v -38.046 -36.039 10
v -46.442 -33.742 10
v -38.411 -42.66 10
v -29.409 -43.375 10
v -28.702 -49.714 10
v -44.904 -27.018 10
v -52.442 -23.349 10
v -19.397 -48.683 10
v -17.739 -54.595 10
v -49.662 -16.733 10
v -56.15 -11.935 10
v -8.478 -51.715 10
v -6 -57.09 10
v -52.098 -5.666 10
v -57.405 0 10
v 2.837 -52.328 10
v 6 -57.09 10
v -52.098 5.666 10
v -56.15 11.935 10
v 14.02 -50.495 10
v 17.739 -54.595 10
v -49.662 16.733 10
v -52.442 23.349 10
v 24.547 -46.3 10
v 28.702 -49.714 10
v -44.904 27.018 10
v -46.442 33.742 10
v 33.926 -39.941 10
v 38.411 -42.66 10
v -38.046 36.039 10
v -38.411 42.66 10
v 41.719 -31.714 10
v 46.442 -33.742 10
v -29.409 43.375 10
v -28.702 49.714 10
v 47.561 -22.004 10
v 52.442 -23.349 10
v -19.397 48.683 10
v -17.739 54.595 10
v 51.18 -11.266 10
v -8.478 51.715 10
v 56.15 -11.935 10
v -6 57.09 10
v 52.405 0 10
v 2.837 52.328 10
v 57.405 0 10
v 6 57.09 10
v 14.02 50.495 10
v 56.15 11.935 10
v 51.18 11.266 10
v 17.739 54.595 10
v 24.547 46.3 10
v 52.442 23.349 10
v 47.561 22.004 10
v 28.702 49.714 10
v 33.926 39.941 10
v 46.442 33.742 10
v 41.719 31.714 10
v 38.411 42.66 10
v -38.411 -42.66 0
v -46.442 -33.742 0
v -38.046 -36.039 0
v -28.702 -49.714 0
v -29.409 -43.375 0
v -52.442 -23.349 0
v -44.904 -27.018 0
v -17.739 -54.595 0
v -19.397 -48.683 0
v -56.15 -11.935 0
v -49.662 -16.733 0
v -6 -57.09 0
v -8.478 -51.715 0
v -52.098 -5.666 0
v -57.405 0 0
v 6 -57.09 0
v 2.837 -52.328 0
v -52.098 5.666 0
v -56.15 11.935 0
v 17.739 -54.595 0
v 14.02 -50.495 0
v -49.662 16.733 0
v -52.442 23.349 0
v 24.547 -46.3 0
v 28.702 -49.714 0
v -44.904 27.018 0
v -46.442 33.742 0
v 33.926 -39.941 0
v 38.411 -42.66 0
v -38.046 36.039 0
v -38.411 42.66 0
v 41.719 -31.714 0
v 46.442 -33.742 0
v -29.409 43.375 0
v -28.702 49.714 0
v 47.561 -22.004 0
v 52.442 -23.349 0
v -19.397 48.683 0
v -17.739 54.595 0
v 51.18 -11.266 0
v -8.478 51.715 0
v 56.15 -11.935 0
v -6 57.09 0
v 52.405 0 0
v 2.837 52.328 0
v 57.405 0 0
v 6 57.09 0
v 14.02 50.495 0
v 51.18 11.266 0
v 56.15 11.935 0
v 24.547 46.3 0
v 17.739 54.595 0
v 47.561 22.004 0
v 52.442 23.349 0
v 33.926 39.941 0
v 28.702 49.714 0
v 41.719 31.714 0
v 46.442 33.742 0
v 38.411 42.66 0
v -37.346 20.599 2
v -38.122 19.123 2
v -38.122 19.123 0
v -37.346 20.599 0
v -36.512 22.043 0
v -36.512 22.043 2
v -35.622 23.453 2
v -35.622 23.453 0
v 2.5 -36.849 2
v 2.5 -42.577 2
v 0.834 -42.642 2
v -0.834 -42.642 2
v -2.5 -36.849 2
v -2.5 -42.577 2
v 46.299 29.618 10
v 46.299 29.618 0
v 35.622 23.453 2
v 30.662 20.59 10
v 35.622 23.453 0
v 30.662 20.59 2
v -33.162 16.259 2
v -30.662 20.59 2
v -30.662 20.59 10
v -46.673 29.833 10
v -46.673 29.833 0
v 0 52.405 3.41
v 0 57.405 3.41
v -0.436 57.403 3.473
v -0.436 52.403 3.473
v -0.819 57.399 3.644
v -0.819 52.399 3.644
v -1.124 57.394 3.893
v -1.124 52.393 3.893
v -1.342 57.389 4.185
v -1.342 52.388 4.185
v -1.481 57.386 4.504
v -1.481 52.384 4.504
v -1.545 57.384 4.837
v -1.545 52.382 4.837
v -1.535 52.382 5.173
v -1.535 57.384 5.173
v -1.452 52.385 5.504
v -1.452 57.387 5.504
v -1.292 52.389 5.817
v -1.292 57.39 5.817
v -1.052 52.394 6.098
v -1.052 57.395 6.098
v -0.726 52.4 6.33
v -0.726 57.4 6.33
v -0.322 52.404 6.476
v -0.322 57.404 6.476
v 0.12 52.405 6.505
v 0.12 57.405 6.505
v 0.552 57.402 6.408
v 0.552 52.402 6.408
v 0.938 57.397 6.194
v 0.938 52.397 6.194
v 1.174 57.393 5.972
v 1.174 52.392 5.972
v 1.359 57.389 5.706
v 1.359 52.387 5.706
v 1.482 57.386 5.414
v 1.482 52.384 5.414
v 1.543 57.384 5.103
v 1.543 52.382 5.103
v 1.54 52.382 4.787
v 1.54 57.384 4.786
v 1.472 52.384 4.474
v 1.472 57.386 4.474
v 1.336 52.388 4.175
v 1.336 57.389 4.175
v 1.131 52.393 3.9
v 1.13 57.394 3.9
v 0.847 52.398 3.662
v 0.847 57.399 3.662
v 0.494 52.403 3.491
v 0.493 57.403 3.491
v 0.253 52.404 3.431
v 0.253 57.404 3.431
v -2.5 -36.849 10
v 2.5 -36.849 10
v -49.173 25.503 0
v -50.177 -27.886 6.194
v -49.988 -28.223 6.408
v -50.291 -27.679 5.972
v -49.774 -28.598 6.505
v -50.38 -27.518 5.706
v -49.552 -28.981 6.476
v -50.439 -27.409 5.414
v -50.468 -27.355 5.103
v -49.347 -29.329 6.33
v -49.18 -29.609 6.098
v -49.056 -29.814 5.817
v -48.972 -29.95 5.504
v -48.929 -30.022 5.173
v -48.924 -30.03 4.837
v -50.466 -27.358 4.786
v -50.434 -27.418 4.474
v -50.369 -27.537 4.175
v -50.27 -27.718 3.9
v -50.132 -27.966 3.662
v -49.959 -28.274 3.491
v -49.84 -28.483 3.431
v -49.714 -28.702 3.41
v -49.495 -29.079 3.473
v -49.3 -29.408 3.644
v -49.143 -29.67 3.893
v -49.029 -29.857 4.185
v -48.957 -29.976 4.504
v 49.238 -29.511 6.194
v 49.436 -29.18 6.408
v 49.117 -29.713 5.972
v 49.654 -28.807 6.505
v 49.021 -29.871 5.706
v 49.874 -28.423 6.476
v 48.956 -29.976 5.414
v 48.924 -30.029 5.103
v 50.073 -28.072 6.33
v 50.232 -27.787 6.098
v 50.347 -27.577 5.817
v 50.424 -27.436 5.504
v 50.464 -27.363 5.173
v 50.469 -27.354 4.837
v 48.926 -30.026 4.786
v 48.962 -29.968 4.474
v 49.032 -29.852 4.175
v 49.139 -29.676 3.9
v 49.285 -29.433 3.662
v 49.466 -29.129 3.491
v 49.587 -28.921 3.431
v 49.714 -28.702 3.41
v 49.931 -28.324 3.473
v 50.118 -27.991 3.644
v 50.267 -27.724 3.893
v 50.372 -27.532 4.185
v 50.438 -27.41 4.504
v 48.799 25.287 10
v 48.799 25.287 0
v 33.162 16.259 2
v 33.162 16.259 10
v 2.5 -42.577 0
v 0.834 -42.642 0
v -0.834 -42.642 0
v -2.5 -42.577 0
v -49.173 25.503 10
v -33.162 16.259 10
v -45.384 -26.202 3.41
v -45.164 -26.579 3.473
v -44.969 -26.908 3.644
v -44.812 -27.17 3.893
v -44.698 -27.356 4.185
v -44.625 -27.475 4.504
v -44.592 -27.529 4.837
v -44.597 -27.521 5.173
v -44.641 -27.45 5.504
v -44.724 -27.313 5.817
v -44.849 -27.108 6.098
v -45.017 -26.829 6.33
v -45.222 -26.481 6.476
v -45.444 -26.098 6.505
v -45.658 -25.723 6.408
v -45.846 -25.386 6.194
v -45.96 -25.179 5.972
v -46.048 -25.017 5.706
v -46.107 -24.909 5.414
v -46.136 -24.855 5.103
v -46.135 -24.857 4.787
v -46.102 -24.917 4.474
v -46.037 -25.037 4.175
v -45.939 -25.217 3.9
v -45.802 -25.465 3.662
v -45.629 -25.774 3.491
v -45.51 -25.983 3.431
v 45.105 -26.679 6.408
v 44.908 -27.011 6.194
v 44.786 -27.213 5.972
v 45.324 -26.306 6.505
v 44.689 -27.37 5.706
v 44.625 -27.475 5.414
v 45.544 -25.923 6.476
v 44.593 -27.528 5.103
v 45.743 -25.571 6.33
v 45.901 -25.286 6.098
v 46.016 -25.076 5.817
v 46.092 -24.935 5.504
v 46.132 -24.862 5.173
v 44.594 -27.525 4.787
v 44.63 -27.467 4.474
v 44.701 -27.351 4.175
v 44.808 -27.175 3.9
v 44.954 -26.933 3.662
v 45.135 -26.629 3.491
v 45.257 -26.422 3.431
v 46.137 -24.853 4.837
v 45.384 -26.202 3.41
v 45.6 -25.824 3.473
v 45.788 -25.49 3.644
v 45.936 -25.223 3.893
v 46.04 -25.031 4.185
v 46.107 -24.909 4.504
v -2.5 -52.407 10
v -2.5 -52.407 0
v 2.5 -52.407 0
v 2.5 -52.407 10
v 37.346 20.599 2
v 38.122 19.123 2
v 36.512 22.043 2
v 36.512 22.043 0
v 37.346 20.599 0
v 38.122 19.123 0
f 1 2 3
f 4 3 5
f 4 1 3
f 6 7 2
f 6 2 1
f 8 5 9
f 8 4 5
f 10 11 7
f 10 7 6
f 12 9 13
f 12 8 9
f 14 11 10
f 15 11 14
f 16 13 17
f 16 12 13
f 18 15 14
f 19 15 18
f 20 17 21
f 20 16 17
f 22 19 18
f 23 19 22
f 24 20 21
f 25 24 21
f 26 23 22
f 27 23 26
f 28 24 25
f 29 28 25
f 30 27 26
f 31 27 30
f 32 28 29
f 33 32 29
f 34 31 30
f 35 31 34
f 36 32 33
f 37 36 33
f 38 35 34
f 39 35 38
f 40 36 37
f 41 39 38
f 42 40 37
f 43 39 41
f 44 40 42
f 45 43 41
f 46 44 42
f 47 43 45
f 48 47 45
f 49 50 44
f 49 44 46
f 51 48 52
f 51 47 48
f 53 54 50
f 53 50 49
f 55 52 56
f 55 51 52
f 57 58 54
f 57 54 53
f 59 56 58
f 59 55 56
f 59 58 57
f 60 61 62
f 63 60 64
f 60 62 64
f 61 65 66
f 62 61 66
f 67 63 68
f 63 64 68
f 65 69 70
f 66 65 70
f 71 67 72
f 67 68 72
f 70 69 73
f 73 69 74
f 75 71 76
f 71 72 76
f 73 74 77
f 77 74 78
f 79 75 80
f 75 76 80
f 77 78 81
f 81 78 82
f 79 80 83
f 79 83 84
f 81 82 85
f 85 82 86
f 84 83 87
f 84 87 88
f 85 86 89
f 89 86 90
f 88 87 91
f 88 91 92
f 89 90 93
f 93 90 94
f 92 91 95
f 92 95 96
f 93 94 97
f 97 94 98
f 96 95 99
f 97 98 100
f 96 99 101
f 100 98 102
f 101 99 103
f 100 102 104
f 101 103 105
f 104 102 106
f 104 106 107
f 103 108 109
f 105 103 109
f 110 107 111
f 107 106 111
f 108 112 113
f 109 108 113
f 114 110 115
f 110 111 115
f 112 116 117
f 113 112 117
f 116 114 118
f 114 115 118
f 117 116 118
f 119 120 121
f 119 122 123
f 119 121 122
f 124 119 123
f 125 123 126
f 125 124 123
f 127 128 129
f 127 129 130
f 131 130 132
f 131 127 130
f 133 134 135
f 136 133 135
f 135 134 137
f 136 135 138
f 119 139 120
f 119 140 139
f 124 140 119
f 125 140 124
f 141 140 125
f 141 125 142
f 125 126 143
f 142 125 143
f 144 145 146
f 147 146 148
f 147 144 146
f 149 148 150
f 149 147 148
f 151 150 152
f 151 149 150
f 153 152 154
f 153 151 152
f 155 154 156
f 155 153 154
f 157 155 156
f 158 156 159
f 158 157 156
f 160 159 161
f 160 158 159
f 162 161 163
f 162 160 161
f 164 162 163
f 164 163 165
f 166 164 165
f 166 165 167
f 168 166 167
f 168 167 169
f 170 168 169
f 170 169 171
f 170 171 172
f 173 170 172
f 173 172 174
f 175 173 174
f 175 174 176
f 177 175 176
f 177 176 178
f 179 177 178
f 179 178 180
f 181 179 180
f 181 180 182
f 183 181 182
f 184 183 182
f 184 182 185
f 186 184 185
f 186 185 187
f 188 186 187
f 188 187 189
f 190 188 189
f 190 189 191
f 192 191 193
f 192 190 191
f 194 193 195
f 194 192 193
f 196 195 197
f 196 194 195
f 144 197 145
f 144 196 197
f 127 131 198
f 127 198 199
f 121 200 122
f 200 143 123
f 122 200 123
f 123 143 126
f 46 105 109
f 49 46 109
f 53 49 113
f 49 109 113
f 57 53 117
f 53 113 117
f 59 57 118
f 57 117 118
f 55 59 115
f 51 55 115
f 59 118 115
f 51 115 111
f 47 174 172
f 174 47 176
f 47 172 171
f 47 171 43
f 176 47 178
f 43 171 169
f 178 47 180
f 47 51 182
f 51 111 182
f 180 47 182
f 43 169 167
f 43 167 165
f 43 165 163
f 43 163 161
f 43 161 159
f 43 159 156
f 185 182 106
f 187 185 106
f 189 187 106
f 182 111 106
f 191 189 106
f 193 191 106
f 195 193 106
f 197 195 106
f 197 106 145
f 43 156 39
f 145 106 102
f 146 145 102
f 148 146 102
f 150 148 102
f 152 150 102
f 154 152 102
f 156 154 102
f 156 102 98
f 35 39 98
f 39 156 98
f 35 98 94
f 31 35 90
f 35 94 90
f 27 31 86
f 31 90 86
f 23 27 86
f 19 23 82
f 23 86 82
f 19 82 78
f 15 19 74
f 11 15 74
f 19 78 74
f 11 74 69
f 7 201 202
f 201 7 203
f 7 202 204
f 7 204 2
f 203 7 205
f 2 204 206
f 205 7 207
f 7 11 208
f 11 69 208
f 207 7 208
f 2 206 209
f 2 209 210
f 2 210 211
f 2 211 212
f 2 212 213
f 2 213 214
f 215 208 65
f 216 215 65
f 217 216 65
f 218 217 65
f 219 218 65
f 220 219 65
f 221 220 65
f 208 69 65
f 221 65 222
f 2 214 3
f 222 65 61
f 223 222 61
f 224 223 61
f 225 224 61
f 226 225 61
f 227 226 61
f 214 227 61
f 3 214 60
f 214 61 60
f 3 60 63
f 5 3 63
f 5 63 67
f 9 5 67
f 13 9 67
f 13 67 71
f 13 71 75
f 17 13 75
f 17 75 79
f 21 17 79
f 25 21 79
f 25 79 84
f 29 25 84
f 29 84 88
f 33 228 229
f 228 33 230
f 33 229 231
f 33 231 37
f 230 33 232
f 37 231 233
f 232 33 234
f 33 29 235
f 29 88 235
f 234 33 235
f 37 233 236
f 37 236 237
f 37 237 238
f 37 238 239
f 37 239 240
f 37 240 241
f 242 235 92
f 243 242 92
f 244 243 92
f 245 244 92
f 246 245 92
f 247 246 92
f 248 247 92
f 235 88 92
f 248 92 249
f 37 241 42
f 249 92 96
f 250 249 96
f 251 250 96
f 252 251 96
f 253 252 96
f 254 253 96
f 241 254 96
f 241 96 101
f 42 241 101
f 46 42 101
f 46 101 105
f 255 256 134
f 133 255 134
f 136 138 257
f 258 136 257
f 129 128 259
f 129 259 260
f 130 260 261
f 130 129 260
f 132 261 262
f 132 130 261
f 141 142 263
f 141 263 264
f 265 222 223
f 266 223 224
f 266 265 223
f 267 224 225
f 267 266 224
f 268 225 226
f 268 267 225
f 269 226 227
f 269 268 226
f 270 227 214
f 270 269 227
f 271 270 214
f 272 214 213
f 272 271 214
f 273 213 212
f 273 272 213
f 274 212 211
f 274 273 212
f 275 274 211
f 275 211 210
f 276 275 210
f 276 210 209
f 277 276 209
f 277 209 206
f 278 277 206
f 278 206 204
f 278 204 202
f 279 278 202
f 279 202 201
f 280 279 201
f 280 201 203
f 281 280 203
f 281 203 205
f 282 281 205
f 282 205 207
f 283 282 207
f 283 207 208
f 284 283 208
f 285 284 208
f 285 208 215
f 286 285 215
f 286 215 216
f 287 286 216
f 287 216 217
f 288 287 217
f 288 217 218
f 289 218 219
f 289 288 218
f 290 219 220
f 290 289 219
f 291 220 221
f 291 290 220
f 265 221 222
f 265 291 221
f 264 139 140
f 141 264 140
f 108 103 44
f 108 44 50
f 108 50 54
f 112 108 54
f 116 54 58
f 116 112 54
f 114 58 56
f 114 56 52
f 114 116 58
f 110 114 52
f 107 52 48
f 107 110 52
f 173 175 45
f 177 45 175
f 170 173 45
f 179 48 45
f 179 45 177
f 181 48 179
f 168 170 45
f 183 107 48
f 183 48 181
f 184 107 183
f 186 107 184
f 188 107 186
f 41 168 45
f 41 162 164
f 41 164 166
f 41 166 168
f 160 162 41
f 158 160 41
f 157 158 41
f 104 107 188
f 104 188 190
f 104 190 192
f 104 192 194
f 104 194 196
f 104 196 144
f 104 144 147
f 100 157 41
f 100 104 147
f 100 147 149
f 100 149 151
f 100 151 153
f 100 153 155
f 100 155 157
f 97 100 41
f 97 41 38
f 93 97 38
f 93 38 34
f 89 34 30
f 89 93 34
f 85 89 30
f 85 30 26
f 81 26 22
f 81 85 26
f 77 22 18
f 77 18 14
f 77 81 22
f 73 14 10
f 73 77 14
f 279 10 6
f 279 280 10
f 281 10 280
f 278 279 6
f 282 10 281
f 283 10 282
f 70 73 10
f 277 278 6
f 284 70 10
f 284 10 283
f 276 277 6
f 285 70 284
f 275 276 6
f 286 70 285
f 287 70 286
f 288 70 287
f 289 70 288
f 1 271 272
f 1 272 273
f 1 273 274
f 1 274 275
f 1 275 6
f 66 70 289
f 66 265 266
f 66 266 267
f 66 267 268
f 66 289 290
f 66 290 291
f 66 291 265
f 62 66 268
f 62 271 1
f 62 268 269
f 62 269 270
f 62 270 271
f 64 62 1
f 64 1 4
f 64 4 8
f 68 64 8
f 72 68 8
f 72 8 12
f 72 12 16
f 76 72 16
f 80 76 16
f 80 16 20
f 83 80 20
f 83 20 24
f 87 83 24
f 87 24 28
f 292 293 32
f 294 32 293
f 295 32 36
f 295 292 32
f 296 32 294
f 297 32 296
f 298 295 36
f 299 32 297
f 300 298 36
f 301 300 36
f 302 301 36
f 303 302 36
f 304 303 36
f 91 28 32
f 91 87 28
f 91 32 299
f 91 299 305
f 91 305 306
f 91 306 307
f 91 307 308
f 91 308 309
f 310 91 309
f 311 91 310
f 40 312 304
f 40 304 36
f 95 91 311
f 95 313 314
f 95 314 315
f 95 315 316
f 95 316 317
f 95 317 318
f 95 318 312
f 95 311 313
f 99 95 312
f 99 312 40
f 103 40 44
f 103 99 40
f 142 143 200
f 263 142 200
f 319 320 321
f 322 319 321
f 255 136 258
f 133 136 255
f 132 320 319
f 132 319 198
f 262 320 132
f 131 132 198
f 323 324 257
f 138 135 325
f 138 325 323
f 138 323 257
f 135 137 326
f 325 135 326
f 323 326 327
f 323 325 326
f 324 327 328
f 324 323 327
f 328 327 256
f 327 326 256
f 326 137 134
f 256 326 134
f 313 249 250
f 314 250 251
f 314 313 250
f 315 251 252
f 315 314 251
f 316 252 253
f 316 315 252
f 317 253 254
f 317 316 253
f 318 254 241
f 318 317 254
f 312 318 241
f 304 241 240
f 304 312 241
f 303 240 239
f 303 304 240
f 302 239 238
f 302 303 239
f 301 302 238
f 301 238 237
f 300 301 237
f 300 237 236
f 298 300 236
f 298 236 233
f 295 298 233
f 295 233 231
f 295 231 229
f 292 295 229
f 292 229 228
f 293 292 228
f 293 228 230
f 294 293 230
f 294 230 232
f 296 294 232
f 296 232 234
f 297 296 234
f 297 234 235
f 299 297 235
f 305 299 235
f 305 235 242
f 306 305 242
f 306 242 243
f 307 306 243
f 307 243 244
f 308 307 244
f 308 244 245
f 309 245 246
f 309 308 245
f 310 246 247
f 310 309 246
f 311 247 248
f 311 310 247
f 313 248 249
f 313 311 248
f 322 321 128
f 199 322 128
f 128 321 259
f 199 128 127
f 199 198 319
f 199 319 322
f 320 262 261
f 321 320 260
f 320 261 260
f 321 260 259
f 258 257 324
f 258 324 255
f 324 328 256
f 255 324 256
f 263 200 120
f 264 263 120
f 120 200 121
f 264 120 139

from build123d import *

# Parameters (mm, degrees)
SKETCH_1_R                 = 57.404900142
SKETCH_1_R_2               = 52.404900142
EXTRUDE_1_DEPTH            = 10
EXTRUDE_1_2_DEPTH          = 10
SKETCH_1_W                 = 5
SKETCH_1_H                 = 15.558252754
EXTRUDE_1_3_DEPTH          = 10
EXTRUDE_1_4_DEPTH          = 10
CUT_EXTRUDE_1_REACH        = 83.796
CUT_EXTRUDE_1_END_RADIUS   = 57.404900142
SKETCH_3_R                 = 1.55
PATTERN_CIRCULAR_1_COUNT   = 3
CUT_EXTRUDE_1_2_DEPTH      = 82.796363895
CUT_EXTRUDE_1_2_DEPTH_BACK = 2


with BuildPart() as part:
    # 草图1 → 拉伸-薄壁1 (new body)
    with BuildSketch(Plane.XY):
        Circle(SKETCH_1_R)
        Circle(SKETCH_1_R_2, mode=Mode.SUBTRACT)
    extrude(amount=EXTRUDE_1_DEPTH)

    # Cut-Extrude 1: up to this cylinder (the profile starts inside it)
    cut_extrude_1_end = Plane(origin=(0, 0, 4.960066), z_dir=(0, 0, -1)) * Cylinder(CUT_EXTRUDE_1_END_RADIUS, 283.401800284, mode=Mode.PRIVATE)
    # 草图3 → Cut-Extrude 1 (cut, up to the surface)
    with BuildSketch(Plane(origin=(0, 0, 0), x_dir=(1, 0, 0), z_dir=(0, 1, 0)), mode=Mode.PRIVATE) as cut_extrude_1_sk1:
        with Locations(Location((0, -4.960065679, 0), (0, 0, 90))):
            Circle(SKETCH_3_R)
    cut_extrude_1_tool1 = extrude(cut_extrude_1_sk1.sketch, amount=CUT_EXTRUDE_1_REACH, mode=Mode.PRIVATE) & cut_extrude_1_end
    cut_extrude_1 = cut_extrude_1_tool1.solids().sort_by_distance((0, 0, 4.960066))[0]
    add(cut_extrude_1, mode=Mode.SUBTRACT)

    # 阵列(圆周)1: Cut-Extrude 1 ×3 about axis
    pattern_circular_1_axis = Axis((0, 0, 10), (0, 0, -1))
    for i in range(1, PATTERN_CIRCULAR_1_COUNT):
        add(cut_extrude_1.rotate(pattern_circular_1_axis, i * 360 / PATTERN_CIRCULAR_1_COUNT), mode=Mode.SUBTRACT)


with BuildPart() as body_2:
    # 草图1 → Extrude 1 2 (new body)
    with BuildSketch(Plane.XY):
        Polygon((33.162241497, 16.259477709), (48.799038315, 25.287386561), (46.299038315, 29.61751358), (30.662241497, 20.589604728), align=None)
    extrude(amount=EXTRUDE_1_2_DEPTH)


with BuildPart() as body_3:
    # 草图1 → Extrude 1 3 (new body)
    with BuildSketch(Plane.XY):
        with Locations((0, -44.628208814)):
            Rectangle(SKETCH_1_W, SKETCH_1_H)
    extrude(amount=EXTRUDE_1_3_DEPTH)


with BuildPart() as body_4:
    # 草图1 → Extrude 1 4 (new body)
    with BuildSketch(Plane.XY):
        Polygon((-30.662241497, 20.589604728), (-46.673106184, 29.833481765), (-49.173106184, 25.503354746), (-33.162241497, 16.259477709), align=None)
    extrude(amount=EXTRUDE_1_4_DEPTH)


with BuildPart() as cut_extrude_1_2_tool:
    # 草图4 → Cut-Extrude 1 2 (new, two sides: drawn at the far end of the back side and taken through both)
    with BuildSketch(Plane(origin=(0, 0, 0), x_dir=(-1, 0, 0), z_dir=(0, 0, -1)).offset(-CUT_EXTRUDE_1_2_DEPTH_BACK)):
        with BuildLine():
            ThreePointArc((-7.526470588, 41.980647214), (0, -42.65), (7.526470588, 41.980647214))
            Line((7.526470588, 41.980647214), (6.326470588, 35.287367001))
            ThreePointArc((6.326470588, 35.287367001), (0, -35.85), (-6.326470588, 35.287367001))
            Line((-6.326470588, 35.287367001), (-7.526470588, 41.980647214))
        make_face()
    extrude(amount=CUT_EXTRUDE_1_2_DEPTH + CUT_EXTRUDE_1_2_DEPTH_BACK)


with BuildPart() as body_2_1:
    add(body_2.part)

    # Cut-Extrude 1 2: cut by cut_extrude_1_2_tool
    add(cut_extrude_1_2_tool.part, mode=Mode.SUBTRACT)


with BuildPart() as body_3_1:
    add(body_3.part)

    # Cut-Extrude 1 2: cut by cut_extrude_1_2_tool
    add(cut_extrude_1_2_tool.part, mode=Mode.SUBTRACT)


with BuildPart() as body_4_1:
    add(body_4.part)

    # Cut-Extrude 1 2: cut by cut_extrude_1_2_tool
    add(cut_extrude_1_2_tool.part, mode=Mode.SUBTRACT)


solid = Compound([part.part, body_2_1.part, body_3_1.part, body_4_1.part])
